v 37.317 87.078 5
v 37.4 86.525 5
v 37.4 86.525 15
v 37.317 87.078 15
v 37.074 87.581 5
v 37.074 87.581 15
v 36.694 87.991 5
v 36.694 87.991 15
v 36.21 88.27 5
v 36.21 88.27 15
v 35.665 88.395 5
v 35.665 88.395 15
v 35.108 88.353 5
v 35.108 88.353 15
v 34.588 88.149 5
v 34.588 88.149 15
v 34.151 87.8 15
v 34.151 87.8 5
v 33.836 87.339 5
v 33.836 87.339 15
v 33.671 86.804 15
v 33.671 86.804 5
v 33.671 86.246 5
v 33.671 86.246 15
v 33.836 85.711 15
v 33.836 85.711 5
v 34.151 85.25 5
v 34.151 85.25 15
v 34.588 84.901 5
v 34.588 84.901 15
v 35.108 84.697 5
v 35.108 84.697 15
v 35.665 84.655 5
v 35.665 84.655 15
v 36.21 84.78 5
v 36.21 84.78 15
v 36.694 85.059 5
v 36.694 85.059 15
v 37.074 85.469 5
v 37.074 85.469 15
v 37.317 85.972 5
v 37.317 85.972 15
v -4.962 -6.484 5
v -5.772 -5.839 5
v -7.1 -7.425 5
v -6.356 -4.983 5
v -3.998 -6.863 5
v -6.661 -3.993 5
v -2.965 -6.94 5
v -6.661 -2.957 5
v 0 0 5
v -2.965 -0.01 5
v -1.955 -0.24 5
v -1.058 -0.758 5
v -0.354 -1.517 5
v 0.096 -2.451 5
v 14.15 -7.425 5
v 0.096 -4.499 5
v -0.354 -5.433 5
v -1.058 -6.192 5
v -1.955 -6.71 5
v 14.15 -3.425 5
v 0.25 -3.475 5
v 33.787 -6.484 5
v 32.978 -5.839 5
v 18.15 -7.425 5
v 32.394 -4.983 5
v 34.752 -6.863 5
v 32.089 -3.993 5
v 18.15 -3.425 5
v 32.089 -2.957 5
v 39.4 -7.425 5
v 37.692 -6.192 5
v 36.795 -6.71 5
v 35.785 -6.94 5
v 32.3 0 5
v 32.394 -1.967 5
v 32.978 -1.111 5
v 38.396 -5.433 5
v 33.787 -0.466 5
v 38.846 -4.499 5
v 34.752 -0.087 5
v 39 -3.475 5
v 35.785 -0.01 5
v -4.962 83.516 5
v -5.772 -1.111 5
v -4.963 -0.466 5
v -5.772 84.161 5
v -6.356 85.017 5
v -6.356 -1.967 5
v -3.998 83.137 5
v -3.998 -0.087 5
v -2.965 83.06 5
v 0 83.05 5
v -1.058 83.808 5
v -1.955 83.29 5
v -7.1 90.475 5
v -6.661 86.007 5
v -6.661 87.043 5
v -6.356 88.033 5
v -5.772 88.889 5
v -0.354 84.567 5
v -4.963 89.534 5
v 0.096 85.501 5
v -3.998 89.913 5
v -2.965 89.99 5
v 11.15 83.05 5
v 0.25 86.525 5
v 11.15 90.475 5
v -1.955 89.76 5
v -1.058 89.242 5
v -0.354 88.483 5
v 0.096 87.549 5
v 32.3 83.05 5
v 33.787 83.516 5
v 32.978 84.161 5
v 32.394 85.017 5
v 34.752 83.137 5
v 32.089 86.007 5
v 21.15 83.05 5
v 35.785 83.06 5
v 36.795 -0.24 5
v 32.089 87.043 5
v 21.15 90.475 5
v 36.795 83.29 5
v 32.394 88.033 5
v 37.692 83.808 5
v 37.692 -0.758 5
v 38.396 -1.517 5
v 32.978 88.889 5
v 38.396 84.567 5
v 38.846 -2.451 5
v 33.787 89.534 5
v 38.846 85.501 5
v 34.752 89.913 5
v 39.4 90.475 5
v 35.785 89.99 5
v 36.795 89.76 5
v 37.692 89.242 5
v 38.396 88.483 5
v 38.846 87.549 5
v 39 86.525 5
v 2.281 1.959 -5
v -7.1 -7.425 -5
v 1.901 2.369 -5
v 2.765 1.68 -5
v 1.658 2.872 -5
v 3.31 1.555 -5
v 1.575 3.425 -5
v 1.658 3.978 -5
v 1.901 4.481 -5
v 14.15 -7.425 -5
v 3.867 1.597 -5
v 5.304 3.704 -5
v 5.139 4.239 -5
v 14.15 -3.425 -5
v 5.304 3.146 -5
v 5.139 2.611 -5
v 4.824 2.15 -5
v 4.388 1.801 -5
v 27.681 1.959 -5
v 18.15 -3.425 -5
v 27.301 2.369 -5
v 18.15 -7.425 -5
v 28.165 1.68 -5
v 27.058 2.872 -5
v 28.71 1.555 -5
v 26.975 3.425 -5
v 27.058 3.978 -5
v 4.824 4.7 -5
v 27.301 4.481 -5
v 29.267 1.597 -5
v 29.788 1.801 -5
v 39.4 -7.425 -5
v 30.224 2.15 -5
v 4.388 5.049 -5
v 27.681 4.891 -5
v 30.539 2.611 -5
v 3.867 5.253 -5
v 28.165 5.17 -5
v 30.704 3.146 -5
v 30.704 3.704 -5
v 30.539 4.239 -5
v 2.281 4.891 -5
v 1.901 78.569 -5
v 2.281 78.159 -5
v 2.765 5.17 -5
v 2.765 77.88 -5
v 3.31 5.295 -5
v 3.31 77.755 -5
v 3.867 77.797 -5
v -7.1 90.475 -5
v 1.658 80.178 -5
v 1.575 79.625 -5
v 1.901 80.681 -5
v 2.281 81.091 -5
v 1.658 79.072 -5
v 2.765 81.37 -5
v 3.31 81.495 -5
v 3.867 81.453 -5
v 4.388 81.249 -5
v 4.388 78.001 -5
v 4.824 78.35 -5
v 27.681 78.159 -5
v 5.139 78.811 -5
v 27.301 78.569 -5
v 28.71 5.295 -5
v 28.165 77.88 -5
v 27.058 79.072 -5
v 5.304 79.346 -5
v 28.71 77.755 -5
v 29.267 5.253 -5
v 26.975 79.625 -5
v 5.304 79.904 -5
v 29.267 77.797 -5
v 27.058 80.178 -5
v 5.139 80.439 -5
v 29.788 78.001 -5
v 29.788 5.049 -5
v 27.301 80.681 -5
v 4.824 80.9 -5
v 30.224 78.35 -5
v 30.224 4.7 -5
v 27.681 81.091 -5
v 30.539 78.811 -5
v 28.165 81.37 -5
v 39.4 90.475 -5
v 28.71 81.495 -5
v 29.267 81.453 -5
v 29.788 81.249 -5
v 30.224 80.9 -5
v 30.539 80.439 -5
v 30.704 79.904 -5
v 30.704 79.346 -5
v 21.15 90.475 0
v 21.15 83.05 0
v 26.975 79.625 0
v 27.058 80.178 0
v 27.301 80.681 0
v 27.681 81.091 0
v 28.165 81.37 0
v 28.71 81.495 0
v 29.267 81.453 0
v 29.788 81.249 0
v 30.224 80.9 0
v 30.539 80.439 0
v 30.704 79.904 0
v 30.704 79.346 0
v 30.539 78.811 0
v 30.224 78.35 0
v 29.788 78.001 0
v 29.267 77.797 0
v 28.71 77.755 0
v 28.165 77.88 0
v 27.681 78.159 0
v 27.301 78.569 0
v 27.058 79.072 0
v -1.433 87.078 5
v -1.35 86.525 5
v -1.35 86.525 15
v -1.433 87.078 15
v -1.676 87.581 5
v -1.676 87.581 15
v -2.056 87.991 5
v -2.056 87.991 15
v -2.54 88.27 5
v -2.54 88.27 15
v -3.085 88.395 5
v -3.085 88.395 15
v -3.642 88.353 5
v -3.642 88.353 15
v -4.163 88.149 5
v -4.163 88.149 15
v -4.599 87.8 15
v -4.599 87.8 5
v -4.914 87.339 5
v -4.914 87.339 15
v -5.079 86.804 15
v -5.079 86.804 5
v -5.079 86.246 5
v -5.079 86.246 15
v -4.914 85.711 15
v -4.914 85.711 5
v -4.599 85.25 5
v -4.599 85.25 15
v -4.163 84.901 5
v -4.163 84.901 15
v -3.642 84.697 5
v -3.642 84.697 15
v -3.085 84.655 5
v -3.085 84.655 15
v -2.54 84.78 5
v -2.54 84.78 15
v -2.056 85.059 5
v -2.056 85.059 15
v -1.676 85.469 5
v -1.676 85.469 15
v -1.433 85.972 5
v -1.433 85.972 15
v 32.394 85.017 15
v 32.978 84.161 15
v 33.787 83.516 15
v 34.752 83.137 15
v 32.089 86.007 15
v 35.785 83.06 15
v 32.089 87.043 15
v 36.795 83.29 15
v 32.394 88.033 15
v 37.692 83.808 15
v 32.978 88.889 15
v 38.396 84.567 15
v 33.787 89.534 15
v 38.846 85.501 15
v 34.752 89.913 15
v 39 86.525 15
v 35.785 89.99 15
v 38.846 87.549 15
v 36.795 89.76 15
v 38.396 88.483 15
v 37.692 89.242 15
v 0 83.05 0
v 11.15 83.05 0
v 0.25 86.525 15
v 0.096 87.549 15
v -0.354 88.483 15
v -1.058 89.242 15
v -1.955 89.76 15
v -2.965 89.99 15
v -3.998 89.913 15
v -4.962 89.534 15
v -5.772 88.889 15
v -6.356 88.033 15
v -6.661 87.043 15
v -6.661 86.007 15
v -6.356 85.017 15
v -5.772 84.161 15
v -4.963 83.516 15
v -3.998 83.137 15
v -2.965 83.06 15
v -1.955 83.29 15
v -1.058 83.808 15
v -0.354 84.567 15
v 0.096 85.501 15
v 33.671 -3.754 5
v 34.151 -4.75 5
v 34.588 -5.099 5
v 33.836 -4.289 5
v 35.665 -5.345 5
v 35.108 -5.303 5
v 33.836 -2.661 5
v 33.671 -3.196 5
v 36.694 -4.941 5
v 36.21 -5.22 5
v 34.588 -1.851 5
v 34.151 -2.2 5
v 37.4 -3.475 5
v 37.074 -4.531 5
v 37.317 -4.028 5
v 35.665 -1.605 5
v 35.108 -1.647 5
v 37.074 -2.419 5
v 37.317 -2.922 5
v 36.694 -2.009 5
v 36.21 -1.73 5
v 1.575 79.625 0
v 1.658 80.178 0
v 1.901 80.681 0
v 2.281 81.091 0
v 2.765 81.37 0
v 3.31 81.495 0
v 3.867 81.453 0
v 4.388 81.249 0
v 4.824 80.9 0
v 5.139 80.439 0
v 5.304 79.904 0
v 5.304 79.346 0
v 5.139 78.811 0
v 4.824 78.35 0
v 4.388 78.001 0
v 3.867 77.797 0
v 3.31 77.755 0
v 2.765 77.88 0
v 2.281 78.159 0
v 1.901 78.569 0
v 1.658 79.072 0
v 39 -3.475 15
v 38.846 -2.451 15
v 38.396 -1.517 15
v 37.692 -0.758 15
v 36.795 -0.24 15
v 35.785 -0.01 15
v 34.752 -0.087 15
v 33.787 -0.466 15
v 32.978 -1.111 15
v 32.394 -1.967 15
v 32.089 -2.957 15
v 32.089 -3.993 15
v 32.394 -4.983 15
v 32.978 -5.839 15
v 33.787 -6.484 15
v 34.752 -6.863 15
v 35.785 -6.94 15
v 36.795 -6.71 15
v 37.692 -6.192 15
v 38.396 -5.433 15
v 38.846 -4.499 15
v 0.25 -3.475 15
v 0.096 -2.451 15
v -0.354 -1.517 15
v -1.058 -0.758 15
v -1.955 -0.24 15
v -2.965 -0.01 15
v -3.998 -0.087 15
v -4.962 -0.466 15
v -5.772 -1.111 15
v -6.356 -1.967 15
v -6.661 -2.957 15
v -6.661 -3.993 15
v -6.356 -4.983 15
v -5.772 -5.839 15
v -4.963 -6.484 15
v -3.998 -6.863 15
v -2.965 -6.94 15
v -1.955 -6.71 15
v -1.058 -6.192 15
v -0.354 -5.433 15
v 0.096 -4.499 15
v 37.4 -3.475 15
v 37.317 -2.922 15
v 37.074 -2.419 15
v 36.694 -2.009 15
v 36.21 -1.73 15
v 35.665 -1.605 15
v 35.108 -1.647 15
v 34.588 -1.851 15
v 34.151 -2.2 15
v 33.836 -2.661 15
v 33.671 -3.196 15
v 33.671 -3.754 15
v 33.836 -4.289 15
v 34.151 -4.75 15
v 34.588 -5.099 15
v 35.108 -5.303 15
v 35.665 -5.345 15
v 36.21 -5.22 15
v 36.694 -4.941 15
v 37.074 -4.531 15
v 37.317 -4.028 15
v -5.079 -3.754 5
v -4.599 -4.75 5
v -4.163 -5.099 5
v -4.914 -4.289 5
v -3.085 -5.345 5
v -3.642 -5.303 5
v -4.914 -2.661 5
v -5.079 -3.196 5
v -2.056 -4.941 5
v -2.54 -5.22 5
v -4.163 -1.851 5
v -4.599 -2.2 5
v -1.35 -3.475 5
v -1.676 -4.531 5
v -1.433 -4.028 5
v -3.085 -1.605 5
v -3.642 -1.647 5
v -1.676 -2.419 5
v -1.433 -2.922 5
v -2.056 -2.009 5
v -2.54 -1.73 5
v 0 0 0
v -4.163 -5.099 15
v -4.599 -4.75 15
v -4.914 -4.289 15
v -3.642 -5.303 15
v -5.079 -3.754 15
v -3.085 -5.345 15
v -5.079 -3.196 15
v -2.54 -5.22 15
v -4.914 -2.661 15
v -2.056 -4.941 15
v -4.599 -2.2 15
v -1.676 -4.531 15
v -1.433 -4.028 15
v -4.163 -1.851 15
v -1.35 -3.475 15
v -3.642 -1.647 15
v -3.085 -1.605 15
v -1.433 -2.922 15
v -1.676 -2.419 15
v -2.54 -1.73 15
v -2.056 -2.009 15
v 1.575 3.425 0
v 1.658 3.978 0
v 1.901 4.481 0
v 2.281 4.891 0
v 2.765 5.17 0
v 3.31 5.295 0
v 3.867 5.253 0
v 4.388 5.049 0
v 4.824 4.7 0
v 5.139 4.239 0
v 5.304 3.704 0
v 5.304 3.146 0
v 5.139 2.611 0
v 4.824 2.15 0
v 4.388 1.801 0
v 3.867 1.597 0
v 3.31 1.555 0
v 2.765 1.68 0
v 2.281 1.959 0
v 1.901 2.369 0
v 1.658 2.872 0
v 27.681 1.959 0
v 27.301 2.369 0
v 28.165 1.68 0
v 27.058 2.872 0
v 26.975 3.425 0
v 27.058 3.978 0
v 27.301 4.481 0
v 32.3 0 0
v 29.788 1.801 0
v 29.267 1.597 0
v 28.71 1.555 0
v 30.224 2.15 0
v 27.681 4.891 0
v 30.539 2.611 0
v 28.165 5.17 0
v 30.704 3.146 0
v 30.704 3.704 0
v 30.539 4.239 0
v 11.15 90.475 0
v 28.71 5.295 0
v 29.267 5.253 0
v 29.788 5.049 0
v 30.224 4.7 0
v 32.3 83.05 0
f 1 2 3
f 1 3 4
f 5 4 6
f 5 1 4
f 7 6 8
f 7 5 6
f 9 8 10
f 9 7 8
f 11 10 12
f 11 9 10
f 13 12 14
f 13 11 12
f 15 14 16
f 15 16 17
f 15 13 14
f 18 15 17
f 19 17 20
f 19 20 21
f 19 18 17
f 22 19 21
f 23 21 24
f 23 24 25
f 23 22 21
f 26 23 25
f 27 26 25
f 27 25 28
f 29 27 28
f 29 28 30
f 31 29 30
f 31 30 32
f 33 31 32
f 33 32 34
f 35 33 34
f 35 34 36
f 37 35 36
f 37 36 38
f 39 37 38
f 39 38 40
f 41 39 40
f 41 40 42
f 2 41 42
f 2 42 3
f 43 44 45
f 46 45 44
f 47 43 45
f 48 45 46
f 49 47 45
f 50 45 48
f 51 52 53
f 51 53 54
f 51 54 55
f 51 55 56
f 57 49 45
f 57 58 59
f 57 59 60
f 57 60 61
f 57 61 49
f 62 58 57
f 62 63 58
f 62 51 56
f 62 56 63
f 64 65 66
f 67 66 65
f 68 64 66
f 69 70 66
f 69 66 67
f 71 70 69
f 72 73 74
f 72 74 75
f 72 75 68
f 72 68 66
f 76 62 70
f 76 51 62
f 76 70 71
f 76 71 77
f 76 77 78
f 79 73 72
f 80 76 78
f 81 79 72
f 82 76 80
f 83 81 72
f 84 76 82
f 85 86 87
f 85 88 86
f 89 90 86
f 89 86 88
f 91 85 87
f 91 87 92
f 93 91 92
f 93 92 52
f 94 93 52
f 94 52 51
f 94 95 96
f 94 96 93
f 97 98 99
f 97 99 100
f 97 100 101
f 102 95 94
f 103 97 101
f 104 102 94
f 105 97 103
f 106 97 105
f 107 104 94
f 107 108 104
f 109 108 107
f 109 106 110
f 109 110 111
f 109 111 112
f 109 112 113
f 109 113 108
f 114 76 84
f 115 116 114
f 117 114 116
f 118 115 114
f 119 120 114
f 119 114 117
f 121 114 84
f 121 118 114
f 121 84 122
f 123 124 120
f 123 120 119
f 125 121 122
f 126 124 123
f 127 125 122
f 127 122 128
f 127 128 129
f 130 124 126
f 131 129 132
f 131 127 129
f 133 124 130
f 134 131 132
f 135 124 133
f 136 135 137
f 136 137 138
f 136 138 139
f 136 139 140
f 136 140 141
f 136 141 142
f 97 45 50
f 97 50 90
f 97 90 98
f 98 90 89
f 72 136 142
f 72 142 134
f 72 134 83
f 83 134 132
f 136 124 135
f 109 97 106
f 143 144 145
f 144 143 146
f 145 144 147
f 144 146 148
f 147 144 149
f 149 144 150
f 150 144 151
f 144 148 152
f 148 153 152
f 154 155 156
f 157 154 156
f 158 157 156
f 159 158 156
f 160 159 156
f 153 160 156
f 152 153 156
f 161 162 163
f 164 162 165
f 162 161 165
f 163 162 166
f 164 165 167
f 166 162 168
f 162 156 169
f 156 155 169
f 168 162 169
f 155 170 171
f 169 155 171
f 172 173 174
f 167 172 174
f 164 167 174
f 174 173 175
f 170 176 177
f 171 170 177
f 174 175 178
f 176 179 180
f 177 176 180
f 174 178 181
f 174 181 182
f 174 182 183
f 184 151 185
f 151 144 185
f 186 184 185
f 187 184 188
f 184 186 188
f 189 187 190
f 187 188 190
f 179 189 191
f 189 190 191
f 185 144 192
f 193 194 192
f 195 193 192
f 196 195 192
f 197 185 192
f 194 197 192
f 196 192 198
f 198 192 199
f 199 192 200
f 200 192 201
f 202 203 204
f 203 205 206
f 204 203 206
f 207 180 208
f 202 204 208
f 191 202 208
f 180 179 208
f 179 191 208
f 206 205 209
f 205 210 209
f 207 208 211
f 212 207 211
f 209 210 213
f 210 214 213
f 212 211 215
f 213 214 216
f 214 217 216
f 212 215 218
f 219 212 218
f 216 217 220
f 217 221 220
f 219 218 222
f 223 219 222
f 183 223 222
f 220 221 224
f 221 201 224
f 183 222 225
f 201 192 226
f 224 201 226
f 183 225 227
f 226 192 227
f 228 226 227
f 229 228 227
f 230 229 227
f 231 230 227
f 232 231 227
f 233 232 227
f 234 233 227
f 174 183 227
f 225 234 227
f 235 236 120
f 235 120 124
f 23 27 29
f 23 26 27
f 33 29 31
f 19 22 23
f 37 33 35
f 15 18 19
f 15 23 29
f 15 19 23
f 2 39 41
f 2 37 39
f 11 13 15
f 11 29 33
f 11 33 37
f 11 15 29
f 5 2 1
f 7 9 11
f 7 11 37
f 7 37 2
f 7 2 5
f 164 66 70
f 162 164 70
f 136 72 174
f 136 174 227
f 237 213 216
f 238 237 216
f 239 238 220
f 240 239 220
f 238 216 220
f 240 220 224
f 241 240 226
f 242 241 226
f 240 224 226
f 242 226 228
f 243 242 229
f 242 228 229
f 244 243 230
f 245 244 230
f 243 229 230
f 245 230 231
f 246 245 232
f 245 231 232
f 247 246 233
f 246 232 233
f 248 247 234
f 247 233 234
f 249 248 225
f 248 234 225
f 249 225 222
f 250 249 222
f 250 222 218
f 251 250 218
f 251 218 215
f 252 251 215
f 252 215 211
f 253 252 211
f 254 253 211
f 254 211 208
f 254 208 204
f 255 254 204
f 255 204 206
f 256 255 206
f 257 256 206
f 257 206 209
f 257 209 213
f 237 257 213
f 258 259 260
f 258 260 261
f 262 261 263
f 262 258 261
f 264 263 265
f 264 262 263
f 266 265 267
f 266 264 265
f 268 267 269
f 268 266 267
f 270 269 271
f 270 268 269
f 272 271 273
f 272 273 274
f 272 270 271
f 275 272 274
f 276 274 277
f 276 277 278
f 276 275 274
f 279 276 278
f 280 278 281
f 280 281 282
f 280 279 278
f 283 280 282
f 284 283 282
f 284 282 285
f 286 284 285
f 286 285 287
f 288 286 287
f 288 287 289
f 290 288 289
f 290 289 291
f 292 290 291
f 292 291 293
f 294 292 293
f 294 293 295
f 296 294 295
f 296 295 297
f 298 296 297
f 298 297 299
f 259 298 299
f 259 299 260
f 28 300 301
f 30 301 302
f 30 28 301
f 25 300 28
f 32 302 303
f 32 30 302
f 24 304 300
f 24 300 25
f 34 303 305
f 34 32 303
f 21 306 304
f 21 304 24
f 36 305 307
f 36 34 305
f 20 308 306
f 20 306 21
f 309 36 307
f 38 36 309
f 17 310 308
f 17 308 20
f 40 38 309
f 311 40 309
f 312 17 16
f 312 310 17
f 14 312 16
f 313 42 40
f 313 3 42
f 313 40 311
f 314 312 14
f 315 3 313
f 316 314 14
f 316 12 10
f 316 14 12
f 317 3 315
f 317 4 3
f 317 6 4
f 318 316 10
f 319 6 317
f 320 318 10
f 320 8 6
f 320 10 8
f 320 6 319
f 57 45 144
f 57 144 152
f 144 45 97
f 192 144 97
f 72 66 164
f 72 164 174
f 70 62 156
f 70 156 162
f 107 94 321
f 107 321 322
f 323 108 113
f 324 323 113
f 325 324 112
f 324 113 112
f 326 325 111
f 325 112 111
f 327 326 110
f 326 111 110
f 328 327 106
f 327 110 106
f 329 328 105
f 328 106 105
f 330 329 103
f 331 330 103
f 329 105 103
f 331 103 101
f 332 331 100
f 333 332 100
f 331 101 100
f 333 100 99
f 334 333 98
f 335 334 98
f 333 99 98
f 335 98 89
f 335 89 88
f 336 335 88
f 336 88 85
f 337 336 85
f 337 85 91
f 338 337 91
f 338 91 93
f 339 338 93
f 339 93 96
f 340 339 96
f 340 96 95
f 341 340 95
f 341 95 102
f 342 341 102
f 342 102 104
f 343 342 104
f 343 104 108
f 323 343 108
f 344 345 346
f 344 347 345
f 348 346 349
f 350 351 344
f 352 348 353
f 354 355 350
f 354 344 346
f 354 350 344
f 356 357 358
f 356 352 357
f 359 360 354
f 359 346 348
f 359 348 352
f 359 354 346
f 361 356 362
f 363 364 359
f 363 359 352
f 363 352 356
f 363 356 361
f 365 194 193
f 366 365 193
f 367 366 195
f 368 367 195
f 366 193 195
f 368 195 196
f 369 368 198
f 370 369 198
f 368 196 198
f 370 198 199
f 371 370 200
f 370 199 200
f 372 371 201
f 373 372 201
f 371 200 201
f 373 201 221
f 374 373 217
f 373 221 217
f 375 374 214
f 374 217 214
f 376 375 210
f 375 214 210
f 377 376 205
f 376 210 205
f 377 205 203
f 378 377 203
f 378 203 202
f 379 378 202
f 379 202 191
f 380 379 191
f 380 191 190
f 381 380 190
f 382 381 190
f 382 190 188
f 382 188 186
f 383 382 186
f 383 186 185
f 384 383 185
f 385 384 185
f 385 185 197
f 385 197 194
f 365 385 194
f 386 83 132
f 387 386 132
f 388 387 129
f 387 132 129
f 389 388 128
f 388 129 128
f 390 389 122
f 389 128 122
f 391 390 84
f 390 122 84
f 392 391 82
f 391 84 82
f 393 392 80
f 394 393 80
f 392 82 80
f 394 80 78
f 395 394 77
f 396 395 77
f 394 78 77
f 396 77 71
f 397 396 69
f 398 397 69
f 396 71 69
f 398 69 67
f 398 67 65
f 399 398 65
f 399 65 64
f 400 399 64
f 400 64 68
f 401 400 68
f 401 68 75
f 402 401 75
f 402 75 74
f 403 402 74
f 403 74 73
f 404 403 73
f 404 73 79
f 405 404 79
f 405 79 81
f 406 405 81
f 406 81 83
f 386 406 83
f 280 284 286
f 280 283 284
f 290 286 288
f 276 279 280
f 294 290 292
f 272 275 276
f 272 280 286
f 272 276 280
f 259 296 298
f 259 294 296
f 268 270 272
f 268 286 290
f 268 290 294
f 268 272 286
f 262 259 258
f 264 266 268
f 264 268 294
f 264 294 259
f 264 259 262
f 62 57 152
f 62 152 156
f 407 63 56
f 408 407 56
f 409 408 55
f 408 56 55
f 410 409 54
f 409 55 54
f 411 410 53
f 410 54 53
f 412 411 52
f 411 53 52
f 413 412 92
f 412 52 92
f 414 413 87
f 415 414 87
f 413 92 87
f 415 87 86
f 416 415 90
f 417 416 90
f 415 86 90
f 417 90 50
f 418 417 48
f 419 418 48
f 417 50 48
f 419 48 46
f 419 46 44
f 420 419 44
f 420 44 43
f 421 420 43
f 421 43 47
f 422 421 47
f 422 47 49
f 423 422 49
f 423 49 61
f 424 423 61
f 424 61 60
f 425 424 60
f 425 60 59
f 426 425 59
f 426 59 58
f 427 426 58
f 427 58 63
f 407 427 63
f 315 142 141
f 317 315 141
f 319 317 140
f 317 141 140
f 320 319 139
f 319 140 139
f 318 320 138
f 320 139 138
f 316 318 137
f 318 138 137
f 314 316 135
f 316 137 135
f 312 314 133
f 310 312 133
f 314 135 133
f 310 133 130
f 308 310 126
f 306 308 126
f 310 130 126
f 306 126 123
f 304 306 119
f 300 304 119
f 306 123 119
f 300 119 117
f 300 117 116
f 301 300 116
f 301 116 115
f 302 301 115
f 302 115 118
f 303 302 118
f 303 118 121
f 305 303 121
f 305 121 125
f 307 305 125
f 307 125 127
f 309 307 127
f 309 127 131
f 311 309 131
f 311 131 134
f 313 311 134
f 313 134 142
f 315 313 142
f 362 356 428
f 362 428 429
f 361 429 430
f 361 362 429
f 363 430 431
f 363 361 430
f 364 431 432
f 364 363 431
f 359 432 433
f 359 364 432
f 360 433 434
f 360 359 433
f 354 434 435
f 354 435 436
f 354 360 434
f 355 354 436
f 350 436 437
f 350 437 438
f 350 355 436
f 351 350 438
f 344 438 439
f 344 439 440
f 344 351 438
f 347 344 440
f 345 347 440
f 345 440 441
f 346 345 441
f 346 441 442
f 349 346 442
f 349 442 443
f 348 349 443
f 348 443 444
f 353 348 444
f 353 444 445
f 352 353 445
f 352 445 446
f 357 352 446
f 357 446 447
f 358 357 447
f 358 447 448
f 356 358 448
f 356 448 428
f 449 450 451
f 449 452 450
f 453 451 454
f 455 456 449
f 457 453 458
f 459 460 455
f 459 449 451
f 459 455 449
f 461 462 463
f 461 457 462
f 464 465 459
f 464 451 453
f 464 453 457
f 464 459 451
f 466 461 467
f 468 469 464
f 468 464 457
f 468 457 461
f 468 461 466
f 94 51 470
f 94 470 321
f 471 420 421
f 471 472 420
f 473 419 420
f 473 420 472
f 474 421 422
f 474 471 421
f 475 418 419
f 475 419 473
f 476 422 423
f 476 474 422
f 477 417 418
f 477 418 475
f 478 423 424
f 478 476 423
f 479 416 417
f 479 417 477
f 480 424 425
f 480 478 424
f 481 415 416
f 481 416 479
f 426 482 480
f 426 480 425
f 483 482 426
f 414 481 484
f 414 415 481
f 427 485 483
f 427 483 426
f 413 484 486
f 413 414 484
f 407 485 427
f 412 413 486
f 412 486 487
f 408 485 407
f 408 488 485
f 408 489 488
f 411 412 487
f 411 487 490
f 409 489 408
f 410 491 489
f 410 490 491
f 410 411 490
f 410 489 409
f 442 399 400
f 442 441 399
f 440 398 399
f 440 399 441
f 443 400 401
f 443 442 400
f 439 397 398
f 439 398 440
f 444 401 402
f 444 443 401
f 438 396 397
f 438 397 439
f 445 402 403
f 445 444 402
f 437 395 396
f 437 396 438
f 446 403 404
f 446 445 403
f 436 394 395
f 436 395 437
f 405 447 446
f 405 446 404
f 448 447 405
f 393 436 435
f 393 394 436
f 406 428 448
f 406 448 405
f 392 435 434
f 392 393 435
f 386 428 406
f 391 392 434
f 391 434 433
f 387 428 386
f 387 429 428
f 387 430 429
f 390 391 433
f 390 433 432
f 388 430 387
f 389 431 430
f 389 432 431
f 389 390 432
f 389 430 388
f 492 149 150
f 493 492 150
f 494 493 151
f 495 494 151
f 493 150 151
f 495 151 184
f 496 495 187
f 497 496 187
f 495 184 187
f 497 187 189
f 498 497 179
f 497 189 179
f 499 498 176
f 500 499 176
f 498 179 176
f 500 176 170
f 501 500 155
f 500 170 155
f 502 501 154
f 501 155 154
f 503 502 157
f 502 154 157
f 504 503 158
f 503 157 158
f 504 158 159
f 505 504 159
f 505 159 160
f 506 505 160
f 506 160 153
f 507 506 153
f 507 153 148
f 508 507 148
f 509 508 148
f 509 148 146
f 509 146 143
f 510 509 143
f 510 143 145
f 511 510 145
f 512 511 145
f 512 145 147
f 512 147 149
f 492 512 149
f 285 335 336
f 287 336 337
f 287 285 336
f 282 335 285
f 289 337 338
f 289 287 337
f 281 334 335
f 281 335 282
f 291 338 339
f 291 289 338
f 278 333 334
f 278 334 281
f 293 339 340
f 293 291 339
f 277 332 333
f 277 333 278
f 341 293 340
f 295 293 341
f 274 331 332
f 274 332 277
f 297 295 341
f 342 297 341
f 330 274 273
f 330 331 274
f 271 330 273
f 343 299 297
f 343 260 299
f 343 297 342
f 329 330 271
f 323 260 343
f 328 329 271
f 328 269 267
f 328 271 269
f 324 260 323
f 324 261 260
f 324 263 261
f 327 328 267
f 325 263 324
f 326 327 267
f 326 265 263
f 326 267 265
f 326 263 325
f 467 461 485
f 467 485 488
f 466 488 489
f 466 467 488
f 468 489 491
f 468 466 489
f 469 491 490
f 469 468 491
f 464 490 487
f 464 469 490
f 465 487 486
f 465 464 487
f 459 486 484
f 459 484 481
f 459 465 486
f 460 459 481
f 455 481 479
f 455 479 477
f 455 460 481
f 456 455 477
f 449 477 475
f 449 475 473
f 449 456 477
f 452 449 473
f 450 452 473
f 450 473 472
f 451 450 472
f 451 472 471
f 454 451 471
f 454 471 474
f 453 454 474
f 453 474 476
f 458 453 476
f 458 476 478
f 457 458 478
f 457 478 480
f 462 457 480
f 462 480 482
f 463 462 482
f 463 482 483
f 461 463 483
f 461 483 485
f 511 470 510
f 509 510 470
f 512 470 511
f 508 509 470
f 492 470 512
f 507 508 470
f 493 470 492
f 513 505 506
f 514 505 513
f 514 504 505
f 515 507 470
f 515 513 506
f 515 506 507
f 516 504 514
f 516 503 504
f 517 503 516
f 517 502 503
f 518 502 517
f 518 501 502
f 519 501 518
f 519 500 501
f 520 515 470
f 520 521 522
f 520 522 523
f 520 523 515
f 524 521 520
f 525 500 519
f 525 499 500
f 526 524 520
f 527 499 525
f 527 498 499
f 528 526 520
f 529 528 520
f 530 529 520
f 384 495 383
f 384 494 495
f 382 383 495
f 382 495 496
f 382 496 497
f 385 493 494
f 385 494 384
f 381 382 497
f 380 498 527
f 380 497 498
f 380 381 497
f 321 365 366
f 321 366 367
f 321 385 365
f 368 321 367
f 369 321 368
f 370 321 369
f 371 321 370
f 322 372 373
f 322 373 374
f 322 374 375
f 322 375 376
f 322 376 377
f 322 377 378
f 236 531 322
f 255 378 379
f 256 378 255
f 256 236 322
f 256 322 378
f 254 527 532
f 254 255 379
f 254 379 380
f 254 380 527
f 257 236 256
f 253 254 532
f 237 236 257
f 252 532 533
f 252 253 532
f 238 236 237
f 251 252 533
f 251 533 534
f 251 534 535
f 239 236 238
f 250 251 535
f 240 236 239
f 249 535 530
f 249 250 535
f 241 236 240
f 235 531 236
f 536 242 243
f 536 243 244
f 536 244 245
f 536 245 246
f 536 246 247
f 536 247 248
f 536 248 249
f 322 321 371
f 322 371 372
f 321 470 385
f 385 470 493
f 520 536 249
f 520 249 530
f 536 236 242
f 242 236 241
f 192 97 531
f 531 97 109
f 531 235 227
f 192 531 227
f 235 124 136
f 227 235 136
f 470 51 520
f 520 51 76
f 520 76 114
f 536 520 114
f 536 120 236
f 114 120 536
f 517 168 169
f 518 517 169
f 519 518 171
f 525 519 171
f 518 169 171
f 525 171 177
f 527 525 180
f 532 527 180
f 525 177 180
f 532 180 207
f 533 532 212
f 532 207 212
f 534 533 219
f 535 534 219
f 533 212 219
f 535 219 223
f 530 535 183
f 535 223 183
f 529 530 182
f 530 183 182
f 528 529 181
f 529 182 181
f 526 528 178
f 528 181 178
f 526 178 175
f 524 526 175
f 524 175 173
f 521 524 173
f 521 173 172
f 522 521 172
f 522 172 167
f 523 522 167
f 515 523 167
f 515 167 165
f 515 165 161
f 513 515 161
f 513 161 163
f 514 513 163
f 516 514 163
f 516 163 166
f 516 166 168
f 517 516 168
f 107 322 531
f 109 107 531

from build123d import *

# Parameters (mm, degrees)
SKETCH2_W                   = 46.5
SKETCH2_H                   = 97.9
SKETCH2_W_2                 = 32.3
SKETCH2_H_2                 = 83.05
BOSS_EXTRUDE1_DEPTH         = 5
SKETCH2_4_W                 = 32.3
SKETCH2_4_H                 = 83.05
SKETCH2_4_W_2               = 25.4
SKETCH2_4_H_2               = 76.2
BOSS_EXTRUDE2_DEPTH         = 5
TAP_DRILL_FOR_M3X0_5_TAP1_D = 3.75
SKETCH7_R                   = 3.475
SKETCH7_R_2                 = 1.875
BOSS_EXTRUDE5_DEPTH         = 15
BOSS_EXTRUDE4_DEPTH         = 97.55
CUT_EXTRUDE1_DEPTH          = 112.426738894
CUT_EXTRUDE1_DEPTH_BACK     = 112.426738894
CUT_EXTRUDE2_DEPTH          = 100.18712429
CUT_EXTRUDE2_DEPTH_BACK     = 5
SKETCH11_W                  = 10
SKETCH11_H                  = 15
SKETCH12_W                  = 4
SKETCH12_H                  = 8
CUT_EXTRUDE3_DEPTH          = 100.18712429


with BuildPart() as part:
    # Sketch2 → Boss-Extrude1 (new, symmetric)
    with BuildSketch(Plane.XY):
        with Locations((16.15, 41.525)):
            Rectangle(SKETCH2_W, SKETCH2_H)
        with Locations((16.15, 41.525)):
            Rectangle(SKETCH2_W_2, SKETCH2_H_2, mode=Mode.SUBTRACT)
    extrude(amount=BOSS_EXTRUDE1_DEPTH, both=True)

    # Sketch2<4> → Boss-Extrude2 (add)
    # profile 1 of 2: a face of its own
    with BuildSketch(Plane.XY):
        with Locations((16.15, 41.525)):
            Rectangle(SKETCH2_4_W, SKETCH2_4_H)
        with Locations((16.15, 41.525)):
            Rectangle(SKETCH2_4_W_2, SKETCH2_4_H_2, mode=Mode.SUBTRACT)
    # profile 2 of 2: a face of its own
    with BuildSketch(Plane.XY):
        with Locations((16.15, 41.525)):
            Rectangle(SKETCH2_4_W_2, SKETCH2_4_H_2)
    extrude(amount=-BOSS_EXTRUDE2_DEPTH)

    # Tap Drill for M3x0.5 Tap1 (through all)
    with Locations(Plane.XY):
        with Locations((3.45, 79.625), (28.85, 79.625), (3.45, 3.425), (28.85, 3.425)):
            Hole(TAP_DRILL_FOR_M3X0_5_TAP1_D / 2)

    # Sketch7 → Boss-Extrude5 (add)
    # profile 1 of 4: a face of its own
    with BuildSketch(Plane.XY):
        with Locations((-3.225, 86.525)):
            Circle(SKETCH7_R)
        with Locations((-3.225, 86.525)):
            Circle(SKETCH7_R_2, mode=Mode.SUBTRACT)
    # profile 2 of 4: a face of its own
    with BuildSketch(Plane.XY):
        with Locations((35.525, 86.525)):
            Circle(SKETCH7_R)
        with Locations((35.525, 86.525)):
            Circle(SKETCH7_R_2, mode=Mode.SUBTRACT)
    # profile 3 of 4: a face of its own
    with BuildSketch(Plane.XY):
        with Locations((-3.225, -3.475)):
            Circle(SKETCH7_R)
        with Locations((-3.225, -3.475)):
            Circle(SKETCH7_R_2, mode=Mode.SUBTRACT)
    # profile 4 of 4: a face of its own
    with BuildSketch(Plane.XY):
        with Locations((35.525, -3.475)):
            Circle(SKETCH7_R)
        with Locations((35.525, -3.475)):
            Circle(SKETCH7_R_2, mode=Mode.SUBTRACT)
    extrude(amount=BOSS_EXTRUDE5_DEPTH)

    # Sketch11 → Cut-Extrude2 (cut, two sides: drawn at the far end of the back side and taken through both)
    with BuildSketch(Plane.XY.offset(5).offset(-CUT_EXTRUDE2_DEPTH_BACK)):
        with Locations((16.15, 83.05)):
            Rectangle(SKETCH11_W, SKETCH11_H)
    extrude(amount=CUT_EXTRUDE2_DEPTH + CUT_EXTRUDE2_DEPTH_BACK, mode=Mode.SUBTRACT)

    # Sketch12 → Cut-Extrude3 (cut, through all)
    with BuildSketch(Plane.XY.offset(5)):
        with Locations((16.15, -7.425)):
            Rectangle(SKETCH12_W, SKETCH12_H)
    extrude(amount=-CUT_EXTRUDE3_DEPTH, mode=Mode.SUBTRACT)


with BuildPart() as body_2:
    # Sketch6 → Boss-Extrude4 (new body)
    with BuildSketch(Plane(origin=(0, 90.475, 0), x_dir=(1, 0, 0), z_dir=(0, 1, 0))):
        with BuildLine():
            Line((-12.283937642, -5.441846212), (-12.33484351, -5.441846212))
            ThreePointArc((-12.33484351, -5.441846212), (16.097911959, -28.999953221), (44.615111123, -5.544136432))
            Line((44.615111123, -5.544136432), (44.564169902, -5.544136432))
            ThreePointArc((44.564169902, -5.544136432), (16.097908608, -28.949953134), (-12.283937642, -5.441846212))
        make_face()
    extrude(amount=-BOSS_EXTRUDE4_DEPTH)

    # Sketch6<2> → Cut-Extrude1 (cut, two sides: drawn at the far end of the back side and taken through both)
    with BuildSketch(Plane(origin=(0, 90.475, 0), x_dir=(1, 0, 0), z_dir=(0, 1, 0)).offset(-CUT_EXTRUDE1_DEPTH_BACK)):
        with BuildLine():
            Line((-12.283937642, -5.441846212), (-12.33484351, -5.441846212))
            ThreePointArc((-12.33484351, -5.441846212), (16.097911959, -28.999953221), (44.615111123, -5.544136432))
            Line((44.615111123, -5.544136432), (44.564169902, -5.544136432))
            ThreePointArc((44.564169902, -5.544136432), (16.097908608, -28.949953134), (-12.283937642, -5.441846212))
        make_face()
    extrude(amount=CUT_EXTRUDE1_DEPTH + CUT_EXTRUDE1_DEPTH_BACK, mode=Mode.SUBTRACT)


solid = part.part
